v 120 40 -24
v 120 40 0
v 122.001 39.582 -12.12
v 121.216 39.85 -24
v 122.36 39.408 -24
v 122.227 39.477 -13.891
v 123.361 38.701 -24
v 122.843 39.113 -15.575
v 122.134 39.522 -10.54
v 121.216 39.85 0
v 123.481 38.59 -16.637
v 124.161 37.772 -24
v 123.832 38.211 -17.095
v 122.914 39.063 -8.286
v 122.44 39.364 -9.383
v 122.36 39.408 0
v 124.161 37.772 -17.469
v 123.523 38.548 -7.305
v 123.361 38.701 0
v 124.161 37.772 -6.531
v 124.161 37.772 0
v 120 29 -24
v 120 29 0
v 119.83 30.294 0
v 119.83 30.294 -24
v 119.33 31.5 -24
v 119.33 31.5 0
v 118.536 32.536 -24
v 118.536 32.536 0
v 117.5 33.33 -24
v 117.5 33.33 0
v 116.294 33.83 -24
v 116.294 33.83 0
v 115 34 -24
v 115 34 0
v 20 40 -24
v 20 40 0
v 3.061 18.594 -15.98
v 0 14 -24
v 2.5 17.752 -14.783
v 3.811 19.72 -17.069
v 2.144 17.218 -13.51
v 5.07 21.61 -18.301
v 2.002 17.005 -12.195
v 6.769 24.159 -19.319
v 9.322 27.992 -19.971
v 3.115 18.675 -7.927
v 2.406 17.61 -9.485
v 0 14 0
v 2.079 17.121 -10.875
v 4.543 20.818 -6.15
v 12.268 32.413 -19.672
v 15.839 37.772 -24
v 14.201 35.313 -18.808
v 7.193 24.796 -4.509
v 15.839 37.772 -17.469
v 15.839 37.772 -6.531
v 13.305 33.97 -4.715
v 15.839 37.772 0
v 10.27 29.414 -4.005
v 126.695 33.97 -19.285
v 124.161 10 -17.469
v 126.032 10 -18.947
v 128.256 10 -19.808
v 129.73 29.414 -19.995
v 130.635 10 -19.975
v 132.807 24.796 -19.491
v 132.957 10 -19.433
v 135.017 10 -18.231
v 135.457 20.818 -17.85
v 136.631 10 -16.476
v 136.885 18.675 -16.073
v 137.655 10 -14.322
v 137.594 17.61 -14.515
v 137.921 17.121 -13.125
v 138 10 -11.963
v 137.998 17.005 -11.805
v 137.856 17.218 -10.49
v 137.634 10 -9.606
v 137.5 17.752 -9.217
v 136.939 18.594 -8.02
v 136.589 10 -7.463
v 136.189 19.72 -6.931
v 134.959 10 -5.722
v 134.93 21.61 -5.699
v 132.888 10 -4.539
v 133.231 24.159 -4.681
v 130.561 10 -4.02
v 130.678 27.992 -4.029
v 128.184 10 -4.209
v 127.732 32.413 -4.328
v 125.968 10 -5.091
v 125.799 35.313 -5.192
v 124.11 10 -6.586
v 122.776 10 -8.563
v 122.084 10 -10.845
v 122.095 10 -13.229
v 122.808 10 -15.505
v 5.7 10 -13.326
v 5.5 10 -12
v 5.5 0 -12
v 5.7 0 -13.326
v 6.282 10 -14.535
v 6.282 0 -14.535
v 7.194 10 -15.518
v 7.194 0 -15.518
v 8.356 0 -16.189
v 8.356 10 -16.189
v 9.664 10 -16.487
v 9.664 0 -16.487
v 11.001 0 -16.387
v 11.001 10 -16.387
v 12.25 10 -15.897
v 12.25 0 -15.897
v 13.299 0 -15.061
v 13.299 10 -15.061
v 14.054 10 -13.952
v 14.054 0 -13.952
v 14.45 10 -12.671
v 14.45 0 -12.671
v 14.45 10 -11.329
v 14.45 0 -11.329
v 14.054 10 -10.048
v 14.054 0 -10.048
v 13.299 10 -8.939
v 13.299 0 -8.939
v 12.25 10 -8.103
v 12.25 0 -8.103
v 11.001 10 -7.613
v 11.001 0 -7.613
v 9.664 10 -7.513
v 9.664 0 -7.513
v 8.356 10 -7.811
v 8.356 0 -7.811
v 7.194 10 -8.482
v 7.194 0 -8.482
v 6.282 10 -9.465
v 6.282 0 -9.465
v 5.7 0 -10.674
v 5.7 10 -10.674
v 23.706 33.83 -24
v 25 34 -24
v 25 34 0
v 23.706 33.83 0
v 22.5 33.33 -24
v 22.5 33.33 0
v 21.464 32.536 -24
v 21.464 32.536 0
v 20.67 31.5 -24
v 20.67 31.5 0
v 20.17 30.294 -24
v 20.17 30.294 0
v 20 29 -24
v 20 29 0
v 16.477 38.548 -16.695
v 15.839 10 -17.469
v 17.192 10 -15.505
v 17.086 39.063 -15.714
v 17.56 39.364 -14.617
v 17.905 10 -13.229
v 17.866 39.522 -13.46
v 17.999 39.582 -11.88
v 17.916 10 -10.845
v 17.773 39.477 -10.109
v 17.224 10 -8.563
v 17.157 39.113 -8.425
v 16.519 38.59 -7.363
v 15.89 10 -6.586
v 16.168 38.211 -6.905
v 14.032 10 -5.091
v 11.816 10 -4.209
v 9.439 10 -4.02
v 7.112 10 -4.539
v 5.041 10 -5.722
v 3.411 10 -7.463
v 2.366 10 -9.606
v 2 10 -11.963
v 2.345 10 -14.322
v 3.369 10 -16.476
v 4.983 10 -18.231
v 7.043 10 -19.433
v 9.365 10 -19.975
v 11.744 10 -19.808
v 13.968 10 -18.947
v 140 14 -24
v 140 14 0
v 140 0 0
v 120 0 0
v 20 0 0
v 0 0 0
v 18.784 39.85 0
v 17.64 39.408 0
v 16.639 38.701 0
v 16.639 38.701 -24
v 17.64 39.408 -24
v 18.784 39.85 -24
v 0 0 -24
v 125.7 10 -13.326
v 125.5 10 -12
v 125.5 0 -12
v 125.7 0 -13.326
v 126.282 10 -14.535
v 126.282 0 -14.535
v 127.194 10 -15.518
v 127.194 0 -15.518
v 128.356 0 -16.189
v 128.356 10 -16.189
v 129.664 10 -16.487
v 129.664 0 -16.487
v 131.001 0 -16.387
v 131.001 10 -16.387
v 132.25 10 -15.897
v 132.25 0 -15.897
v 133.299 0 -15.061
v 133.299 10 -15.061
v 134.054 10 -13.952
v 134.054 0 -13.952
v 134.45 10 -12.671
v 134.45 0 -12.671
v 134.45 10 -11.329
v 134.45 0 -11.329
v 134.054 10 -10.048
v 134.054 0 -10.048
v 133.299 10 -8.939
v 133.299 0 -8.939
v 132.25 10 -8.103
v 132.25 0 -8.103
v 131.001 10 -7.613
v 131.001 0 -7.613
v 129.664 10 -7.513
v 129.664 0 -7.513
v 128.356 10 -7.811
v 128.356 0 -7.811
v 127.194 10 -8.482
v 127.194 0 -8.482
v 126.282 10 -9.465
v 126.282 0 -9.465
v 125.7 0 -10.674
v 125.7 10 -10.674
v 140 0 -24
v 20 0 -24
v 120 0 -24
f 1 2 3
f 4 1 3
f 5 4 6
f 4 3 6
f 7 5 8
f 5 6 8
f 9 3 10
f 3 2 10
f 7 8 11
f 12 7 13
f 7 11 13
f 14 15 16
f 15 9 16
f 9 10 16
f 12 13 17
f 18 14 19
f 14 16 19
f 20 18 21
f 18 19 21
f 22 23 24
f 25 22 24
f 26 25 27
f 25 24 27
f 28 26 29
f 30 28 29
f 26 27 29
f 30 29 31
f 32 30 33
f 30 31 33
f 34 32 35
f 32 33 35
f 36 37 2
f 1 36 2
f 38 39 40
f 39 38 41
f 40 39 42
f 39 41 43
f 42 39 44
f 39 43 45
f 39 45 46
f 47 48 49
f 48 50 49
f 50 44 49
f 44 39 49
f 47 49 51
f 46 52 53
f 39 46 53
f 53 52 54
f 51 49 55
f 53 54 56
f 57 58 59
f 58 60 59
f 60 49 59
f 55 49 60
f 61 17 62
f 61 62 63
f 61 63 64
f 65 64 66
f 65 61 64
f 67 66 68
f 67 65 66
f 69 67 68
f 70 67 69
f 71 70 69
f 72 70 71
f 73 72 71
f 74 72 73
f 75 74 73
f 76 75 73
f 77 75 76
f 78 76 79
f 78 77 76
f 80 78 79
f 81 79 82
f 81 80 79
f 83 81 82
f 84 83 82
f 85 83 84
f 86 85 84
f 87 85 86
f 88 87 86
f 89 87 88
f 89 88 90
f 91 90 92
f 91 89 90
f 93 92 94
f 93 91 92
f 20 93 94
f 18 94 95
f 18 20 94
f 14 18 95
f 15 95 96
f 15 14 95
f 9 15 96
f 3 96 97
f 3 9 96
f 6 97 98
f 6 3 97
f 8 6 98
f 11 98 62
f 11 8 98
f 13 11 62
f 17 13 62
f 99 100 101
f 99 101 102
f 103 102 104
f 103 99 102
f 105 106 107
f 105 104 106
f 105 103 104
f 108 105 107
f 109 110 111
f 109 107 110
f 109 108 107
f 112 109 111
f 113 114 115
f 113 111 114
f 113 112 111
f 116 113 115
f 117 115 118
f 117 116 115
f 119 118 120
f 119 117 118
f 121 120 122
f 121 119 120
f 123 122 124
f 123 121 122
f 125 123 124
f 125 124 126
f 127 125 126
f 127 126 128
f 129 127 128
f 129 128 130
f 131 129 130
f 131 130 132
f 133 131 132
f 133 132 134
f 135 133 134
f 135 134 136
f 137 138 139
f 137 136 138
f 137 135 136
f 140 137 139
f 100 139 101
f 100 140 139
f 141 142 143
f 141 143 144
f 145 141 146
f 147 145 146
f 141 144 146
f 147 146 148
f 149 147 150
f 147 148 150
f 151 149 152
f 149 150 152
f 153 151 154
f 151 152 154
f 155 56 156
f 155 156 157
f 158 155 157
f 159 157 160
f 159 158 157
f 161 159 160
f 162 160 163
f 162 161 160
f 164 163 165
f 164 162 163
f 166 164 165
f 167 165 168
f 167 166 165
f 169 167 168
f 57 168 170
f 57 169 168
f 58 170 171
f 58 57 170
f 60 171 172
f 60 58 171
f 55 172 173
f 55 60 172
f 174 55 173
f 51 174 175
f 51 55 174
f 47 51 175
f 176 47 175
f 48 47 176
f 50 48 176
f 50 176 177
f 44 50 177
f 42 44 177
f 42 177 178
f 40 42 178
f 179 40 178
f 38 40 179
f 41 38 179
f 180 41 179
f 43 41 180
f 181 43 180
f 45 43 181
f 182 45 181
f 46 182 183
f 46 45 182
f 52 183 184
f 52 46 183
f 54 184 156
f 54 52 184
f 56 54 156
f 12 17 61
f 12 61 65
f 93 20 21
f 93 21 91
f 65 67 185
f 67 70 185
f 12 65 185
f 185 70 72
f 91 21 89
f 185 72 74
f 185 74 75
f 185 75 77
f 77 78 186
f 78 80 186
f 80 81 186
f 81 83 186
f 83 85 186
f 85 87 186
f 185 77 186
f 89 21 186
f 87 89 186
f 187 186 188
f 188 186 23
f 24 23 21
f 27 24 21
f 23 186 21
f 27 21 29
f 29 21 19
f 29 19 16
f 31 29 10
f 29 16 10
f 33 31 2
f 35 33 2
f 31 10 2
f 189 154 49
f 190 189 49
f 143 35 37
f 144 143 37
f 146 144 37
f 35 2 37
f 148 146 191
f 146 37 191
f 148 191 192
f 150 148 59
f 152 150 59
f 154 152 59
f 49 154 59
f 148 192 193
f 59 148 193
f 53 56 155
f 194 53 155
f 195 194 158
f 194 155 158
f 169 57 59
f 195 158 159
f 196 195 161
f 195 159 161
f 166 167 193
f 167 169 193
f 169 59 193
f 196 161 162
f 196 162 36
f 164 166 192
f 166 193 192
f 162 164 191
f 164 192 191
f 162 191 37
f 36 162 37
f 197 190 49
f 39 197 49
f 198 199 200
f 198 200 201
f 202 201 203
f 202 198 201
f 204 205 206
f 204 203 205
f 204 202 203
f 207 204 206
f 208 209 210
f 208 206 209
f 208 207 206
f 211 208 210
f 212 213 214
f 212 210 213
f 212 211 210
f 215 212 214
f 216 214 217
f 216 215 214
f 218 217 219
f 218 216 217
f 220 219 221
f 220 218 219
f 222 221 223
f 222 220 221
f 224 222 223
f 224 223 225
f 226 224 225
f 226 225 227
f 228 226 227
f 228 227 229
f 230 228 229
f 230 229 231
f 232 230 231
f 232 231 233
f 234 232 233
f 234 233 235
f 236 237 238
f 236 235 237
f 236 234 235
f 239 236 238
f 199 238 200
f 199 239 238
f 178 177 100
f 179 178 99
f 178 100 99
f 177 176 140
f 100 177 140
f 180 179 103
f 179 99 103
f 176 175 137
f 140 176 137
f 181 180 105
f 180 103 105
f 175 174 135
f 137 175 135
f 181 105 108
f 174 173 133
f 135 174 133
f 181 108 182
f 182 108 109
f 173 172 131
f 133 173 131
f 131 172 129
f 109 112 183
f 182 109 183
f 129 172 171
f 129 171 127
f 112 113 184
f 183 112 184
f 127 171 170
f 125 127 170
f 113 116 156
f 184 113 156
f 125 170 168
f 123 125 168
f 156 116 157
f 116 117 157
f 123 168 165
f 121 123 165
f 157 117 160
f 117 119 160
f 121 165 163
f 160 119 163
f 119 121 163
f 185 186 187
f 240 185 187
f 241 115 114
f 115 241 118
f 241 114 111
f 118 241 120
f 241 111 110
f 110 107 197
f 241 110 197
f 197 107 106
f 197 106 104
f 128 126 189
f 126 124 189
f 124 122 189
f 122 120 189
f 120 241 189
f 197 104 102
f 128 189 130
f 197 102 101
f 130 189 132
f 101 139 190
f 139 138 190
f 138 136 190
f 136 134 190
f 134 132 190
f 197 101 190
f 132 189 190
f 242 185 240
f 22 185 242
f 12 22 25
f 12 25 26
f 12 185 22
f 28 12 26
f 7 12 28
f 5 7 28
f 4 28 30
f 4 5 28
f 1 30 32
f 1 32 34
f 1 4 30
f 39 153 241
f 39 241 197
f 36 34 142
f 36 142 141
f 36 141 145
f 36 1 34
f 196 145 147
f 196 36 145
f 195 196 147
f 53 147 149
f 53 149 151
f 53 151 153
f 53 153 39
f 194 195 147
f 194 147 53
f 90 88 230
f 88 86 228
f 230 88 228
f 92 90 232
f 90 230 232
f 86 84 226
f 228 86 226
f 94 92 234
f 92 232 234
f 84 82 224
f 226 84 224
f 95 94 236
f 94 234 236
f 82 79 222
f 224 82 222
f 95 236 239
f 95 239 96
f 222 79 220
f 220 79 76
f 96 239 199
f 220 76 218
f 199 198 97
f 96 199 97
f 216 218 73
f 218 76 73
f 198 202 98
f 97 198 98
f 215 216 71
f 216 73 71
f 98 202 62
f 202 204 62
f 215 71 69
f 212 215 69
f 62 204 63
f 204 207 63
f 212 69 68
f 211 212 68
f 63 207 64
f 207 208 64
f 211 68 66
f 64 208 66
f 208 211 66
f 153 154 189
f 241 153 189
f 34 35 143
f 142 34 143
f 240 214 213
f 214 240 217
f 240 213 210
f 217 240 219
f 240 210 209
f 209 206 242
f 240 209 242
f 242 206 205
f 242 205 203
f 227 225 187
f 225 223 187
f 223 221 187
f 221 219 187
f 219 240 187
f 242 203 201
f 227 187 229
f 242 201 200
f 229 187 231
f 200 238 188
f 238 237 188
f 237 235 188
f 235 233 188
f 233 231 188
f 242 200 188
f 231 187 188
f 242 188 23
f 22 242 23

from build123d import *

# Parameters (mm, degrees)
EXTRUDE_1_DEPTH          = 24
CUT_EXTRUDE_1_DEPTH      = 148.566933966
CUT_EXTRUDE_1_DEPTH_BACK = 20
SKETCH_2_R               = 4.5
CUT_EXTRUDE_2_DEPTH      = 10
CUT_EXTRUDE_2_DEPTH_BACK = 24
SKETCH_3_R               = 8


with BuildPart() as part:
    # 草图1 → 凸台-拉伸1 (new body)
    with BuildSketch(Plane.XY):
        with BuildLine():
            Line((0, 0), (0, 14))
            Line((0, 14), (15.83900126, 37.772379752))
            ThreePointArc((15.83900126, 37.772379752), (17.640116397, 39.408055056), (20, 40))
            Line((20, 40), (120, 40))
            ThreePointArc((120, 40), (122.359883603, 39.408055056), (124.16099874, 37.772379752))
            Line((124.16099874, 37.772379752), (140, 14))
            Line((140, 14), (140, 0))
            Line((140, 0), (120, 0))
            Line((120, 0), (120, 29))
            ThreePointArc((120, 29), (118.535533906, 32.535533906), (115, 34))
            Line((115, 34), (25, 34))
            ThreePointArc((25, 34), (21.464466094, 32.535533906), (20, 29))
            Line((20, 29), (20, 0))
            Line((20, 0), (0, 0))
        make_face()
    extrude(amount=-EXTRUDE_1_DEPTH)

    # 草图2 → 切除-拉伸1 (cut, two sides: drawn at the far end of the back side and taken through both)
    with BuildSketch(Plane.XZ.offset(-CUT_EXTRUDE_1_DEPTH_BACK)):
        with Locations(Location((10, -12, 0), (0, 0, 180))):
            Circle(SKETCH_2_R)
        with Locations(Location((130, -12, 0), (0, 0, 180))):
            Circle(SKETCH_2_R)
    extrude(amount=CUT_EXTRUDE_1_DEPTH + CUT_EXTRUDE_1_DEPTH_BACK, mode=Mode.SUBTRACT)

    # 草图3 → 切除-拉伸2 (cut, two sides: drawn at the far end of the back side and taken through both)
    with BuildSketch(Plane.XZ.offset(-20).offset(-CUT_EXTRUDE_2_DEPTH_BACK)):
        with Locations(Location((130, -12, 0), (0, 0, 223.124062677))):
            Circle(SKETCH_3_R)
        with Locations(Location((10, -12, 0), (0, 0, 316.875929093))):
            Circle(SKETCH_3_R)
    extrude(amount=CUT_EXTRUDE_2_DEPTH + CUT_EXTRUDE_2_DEPTH_BACK, mode=Mode.SUBTRACT)


solid = part.part
